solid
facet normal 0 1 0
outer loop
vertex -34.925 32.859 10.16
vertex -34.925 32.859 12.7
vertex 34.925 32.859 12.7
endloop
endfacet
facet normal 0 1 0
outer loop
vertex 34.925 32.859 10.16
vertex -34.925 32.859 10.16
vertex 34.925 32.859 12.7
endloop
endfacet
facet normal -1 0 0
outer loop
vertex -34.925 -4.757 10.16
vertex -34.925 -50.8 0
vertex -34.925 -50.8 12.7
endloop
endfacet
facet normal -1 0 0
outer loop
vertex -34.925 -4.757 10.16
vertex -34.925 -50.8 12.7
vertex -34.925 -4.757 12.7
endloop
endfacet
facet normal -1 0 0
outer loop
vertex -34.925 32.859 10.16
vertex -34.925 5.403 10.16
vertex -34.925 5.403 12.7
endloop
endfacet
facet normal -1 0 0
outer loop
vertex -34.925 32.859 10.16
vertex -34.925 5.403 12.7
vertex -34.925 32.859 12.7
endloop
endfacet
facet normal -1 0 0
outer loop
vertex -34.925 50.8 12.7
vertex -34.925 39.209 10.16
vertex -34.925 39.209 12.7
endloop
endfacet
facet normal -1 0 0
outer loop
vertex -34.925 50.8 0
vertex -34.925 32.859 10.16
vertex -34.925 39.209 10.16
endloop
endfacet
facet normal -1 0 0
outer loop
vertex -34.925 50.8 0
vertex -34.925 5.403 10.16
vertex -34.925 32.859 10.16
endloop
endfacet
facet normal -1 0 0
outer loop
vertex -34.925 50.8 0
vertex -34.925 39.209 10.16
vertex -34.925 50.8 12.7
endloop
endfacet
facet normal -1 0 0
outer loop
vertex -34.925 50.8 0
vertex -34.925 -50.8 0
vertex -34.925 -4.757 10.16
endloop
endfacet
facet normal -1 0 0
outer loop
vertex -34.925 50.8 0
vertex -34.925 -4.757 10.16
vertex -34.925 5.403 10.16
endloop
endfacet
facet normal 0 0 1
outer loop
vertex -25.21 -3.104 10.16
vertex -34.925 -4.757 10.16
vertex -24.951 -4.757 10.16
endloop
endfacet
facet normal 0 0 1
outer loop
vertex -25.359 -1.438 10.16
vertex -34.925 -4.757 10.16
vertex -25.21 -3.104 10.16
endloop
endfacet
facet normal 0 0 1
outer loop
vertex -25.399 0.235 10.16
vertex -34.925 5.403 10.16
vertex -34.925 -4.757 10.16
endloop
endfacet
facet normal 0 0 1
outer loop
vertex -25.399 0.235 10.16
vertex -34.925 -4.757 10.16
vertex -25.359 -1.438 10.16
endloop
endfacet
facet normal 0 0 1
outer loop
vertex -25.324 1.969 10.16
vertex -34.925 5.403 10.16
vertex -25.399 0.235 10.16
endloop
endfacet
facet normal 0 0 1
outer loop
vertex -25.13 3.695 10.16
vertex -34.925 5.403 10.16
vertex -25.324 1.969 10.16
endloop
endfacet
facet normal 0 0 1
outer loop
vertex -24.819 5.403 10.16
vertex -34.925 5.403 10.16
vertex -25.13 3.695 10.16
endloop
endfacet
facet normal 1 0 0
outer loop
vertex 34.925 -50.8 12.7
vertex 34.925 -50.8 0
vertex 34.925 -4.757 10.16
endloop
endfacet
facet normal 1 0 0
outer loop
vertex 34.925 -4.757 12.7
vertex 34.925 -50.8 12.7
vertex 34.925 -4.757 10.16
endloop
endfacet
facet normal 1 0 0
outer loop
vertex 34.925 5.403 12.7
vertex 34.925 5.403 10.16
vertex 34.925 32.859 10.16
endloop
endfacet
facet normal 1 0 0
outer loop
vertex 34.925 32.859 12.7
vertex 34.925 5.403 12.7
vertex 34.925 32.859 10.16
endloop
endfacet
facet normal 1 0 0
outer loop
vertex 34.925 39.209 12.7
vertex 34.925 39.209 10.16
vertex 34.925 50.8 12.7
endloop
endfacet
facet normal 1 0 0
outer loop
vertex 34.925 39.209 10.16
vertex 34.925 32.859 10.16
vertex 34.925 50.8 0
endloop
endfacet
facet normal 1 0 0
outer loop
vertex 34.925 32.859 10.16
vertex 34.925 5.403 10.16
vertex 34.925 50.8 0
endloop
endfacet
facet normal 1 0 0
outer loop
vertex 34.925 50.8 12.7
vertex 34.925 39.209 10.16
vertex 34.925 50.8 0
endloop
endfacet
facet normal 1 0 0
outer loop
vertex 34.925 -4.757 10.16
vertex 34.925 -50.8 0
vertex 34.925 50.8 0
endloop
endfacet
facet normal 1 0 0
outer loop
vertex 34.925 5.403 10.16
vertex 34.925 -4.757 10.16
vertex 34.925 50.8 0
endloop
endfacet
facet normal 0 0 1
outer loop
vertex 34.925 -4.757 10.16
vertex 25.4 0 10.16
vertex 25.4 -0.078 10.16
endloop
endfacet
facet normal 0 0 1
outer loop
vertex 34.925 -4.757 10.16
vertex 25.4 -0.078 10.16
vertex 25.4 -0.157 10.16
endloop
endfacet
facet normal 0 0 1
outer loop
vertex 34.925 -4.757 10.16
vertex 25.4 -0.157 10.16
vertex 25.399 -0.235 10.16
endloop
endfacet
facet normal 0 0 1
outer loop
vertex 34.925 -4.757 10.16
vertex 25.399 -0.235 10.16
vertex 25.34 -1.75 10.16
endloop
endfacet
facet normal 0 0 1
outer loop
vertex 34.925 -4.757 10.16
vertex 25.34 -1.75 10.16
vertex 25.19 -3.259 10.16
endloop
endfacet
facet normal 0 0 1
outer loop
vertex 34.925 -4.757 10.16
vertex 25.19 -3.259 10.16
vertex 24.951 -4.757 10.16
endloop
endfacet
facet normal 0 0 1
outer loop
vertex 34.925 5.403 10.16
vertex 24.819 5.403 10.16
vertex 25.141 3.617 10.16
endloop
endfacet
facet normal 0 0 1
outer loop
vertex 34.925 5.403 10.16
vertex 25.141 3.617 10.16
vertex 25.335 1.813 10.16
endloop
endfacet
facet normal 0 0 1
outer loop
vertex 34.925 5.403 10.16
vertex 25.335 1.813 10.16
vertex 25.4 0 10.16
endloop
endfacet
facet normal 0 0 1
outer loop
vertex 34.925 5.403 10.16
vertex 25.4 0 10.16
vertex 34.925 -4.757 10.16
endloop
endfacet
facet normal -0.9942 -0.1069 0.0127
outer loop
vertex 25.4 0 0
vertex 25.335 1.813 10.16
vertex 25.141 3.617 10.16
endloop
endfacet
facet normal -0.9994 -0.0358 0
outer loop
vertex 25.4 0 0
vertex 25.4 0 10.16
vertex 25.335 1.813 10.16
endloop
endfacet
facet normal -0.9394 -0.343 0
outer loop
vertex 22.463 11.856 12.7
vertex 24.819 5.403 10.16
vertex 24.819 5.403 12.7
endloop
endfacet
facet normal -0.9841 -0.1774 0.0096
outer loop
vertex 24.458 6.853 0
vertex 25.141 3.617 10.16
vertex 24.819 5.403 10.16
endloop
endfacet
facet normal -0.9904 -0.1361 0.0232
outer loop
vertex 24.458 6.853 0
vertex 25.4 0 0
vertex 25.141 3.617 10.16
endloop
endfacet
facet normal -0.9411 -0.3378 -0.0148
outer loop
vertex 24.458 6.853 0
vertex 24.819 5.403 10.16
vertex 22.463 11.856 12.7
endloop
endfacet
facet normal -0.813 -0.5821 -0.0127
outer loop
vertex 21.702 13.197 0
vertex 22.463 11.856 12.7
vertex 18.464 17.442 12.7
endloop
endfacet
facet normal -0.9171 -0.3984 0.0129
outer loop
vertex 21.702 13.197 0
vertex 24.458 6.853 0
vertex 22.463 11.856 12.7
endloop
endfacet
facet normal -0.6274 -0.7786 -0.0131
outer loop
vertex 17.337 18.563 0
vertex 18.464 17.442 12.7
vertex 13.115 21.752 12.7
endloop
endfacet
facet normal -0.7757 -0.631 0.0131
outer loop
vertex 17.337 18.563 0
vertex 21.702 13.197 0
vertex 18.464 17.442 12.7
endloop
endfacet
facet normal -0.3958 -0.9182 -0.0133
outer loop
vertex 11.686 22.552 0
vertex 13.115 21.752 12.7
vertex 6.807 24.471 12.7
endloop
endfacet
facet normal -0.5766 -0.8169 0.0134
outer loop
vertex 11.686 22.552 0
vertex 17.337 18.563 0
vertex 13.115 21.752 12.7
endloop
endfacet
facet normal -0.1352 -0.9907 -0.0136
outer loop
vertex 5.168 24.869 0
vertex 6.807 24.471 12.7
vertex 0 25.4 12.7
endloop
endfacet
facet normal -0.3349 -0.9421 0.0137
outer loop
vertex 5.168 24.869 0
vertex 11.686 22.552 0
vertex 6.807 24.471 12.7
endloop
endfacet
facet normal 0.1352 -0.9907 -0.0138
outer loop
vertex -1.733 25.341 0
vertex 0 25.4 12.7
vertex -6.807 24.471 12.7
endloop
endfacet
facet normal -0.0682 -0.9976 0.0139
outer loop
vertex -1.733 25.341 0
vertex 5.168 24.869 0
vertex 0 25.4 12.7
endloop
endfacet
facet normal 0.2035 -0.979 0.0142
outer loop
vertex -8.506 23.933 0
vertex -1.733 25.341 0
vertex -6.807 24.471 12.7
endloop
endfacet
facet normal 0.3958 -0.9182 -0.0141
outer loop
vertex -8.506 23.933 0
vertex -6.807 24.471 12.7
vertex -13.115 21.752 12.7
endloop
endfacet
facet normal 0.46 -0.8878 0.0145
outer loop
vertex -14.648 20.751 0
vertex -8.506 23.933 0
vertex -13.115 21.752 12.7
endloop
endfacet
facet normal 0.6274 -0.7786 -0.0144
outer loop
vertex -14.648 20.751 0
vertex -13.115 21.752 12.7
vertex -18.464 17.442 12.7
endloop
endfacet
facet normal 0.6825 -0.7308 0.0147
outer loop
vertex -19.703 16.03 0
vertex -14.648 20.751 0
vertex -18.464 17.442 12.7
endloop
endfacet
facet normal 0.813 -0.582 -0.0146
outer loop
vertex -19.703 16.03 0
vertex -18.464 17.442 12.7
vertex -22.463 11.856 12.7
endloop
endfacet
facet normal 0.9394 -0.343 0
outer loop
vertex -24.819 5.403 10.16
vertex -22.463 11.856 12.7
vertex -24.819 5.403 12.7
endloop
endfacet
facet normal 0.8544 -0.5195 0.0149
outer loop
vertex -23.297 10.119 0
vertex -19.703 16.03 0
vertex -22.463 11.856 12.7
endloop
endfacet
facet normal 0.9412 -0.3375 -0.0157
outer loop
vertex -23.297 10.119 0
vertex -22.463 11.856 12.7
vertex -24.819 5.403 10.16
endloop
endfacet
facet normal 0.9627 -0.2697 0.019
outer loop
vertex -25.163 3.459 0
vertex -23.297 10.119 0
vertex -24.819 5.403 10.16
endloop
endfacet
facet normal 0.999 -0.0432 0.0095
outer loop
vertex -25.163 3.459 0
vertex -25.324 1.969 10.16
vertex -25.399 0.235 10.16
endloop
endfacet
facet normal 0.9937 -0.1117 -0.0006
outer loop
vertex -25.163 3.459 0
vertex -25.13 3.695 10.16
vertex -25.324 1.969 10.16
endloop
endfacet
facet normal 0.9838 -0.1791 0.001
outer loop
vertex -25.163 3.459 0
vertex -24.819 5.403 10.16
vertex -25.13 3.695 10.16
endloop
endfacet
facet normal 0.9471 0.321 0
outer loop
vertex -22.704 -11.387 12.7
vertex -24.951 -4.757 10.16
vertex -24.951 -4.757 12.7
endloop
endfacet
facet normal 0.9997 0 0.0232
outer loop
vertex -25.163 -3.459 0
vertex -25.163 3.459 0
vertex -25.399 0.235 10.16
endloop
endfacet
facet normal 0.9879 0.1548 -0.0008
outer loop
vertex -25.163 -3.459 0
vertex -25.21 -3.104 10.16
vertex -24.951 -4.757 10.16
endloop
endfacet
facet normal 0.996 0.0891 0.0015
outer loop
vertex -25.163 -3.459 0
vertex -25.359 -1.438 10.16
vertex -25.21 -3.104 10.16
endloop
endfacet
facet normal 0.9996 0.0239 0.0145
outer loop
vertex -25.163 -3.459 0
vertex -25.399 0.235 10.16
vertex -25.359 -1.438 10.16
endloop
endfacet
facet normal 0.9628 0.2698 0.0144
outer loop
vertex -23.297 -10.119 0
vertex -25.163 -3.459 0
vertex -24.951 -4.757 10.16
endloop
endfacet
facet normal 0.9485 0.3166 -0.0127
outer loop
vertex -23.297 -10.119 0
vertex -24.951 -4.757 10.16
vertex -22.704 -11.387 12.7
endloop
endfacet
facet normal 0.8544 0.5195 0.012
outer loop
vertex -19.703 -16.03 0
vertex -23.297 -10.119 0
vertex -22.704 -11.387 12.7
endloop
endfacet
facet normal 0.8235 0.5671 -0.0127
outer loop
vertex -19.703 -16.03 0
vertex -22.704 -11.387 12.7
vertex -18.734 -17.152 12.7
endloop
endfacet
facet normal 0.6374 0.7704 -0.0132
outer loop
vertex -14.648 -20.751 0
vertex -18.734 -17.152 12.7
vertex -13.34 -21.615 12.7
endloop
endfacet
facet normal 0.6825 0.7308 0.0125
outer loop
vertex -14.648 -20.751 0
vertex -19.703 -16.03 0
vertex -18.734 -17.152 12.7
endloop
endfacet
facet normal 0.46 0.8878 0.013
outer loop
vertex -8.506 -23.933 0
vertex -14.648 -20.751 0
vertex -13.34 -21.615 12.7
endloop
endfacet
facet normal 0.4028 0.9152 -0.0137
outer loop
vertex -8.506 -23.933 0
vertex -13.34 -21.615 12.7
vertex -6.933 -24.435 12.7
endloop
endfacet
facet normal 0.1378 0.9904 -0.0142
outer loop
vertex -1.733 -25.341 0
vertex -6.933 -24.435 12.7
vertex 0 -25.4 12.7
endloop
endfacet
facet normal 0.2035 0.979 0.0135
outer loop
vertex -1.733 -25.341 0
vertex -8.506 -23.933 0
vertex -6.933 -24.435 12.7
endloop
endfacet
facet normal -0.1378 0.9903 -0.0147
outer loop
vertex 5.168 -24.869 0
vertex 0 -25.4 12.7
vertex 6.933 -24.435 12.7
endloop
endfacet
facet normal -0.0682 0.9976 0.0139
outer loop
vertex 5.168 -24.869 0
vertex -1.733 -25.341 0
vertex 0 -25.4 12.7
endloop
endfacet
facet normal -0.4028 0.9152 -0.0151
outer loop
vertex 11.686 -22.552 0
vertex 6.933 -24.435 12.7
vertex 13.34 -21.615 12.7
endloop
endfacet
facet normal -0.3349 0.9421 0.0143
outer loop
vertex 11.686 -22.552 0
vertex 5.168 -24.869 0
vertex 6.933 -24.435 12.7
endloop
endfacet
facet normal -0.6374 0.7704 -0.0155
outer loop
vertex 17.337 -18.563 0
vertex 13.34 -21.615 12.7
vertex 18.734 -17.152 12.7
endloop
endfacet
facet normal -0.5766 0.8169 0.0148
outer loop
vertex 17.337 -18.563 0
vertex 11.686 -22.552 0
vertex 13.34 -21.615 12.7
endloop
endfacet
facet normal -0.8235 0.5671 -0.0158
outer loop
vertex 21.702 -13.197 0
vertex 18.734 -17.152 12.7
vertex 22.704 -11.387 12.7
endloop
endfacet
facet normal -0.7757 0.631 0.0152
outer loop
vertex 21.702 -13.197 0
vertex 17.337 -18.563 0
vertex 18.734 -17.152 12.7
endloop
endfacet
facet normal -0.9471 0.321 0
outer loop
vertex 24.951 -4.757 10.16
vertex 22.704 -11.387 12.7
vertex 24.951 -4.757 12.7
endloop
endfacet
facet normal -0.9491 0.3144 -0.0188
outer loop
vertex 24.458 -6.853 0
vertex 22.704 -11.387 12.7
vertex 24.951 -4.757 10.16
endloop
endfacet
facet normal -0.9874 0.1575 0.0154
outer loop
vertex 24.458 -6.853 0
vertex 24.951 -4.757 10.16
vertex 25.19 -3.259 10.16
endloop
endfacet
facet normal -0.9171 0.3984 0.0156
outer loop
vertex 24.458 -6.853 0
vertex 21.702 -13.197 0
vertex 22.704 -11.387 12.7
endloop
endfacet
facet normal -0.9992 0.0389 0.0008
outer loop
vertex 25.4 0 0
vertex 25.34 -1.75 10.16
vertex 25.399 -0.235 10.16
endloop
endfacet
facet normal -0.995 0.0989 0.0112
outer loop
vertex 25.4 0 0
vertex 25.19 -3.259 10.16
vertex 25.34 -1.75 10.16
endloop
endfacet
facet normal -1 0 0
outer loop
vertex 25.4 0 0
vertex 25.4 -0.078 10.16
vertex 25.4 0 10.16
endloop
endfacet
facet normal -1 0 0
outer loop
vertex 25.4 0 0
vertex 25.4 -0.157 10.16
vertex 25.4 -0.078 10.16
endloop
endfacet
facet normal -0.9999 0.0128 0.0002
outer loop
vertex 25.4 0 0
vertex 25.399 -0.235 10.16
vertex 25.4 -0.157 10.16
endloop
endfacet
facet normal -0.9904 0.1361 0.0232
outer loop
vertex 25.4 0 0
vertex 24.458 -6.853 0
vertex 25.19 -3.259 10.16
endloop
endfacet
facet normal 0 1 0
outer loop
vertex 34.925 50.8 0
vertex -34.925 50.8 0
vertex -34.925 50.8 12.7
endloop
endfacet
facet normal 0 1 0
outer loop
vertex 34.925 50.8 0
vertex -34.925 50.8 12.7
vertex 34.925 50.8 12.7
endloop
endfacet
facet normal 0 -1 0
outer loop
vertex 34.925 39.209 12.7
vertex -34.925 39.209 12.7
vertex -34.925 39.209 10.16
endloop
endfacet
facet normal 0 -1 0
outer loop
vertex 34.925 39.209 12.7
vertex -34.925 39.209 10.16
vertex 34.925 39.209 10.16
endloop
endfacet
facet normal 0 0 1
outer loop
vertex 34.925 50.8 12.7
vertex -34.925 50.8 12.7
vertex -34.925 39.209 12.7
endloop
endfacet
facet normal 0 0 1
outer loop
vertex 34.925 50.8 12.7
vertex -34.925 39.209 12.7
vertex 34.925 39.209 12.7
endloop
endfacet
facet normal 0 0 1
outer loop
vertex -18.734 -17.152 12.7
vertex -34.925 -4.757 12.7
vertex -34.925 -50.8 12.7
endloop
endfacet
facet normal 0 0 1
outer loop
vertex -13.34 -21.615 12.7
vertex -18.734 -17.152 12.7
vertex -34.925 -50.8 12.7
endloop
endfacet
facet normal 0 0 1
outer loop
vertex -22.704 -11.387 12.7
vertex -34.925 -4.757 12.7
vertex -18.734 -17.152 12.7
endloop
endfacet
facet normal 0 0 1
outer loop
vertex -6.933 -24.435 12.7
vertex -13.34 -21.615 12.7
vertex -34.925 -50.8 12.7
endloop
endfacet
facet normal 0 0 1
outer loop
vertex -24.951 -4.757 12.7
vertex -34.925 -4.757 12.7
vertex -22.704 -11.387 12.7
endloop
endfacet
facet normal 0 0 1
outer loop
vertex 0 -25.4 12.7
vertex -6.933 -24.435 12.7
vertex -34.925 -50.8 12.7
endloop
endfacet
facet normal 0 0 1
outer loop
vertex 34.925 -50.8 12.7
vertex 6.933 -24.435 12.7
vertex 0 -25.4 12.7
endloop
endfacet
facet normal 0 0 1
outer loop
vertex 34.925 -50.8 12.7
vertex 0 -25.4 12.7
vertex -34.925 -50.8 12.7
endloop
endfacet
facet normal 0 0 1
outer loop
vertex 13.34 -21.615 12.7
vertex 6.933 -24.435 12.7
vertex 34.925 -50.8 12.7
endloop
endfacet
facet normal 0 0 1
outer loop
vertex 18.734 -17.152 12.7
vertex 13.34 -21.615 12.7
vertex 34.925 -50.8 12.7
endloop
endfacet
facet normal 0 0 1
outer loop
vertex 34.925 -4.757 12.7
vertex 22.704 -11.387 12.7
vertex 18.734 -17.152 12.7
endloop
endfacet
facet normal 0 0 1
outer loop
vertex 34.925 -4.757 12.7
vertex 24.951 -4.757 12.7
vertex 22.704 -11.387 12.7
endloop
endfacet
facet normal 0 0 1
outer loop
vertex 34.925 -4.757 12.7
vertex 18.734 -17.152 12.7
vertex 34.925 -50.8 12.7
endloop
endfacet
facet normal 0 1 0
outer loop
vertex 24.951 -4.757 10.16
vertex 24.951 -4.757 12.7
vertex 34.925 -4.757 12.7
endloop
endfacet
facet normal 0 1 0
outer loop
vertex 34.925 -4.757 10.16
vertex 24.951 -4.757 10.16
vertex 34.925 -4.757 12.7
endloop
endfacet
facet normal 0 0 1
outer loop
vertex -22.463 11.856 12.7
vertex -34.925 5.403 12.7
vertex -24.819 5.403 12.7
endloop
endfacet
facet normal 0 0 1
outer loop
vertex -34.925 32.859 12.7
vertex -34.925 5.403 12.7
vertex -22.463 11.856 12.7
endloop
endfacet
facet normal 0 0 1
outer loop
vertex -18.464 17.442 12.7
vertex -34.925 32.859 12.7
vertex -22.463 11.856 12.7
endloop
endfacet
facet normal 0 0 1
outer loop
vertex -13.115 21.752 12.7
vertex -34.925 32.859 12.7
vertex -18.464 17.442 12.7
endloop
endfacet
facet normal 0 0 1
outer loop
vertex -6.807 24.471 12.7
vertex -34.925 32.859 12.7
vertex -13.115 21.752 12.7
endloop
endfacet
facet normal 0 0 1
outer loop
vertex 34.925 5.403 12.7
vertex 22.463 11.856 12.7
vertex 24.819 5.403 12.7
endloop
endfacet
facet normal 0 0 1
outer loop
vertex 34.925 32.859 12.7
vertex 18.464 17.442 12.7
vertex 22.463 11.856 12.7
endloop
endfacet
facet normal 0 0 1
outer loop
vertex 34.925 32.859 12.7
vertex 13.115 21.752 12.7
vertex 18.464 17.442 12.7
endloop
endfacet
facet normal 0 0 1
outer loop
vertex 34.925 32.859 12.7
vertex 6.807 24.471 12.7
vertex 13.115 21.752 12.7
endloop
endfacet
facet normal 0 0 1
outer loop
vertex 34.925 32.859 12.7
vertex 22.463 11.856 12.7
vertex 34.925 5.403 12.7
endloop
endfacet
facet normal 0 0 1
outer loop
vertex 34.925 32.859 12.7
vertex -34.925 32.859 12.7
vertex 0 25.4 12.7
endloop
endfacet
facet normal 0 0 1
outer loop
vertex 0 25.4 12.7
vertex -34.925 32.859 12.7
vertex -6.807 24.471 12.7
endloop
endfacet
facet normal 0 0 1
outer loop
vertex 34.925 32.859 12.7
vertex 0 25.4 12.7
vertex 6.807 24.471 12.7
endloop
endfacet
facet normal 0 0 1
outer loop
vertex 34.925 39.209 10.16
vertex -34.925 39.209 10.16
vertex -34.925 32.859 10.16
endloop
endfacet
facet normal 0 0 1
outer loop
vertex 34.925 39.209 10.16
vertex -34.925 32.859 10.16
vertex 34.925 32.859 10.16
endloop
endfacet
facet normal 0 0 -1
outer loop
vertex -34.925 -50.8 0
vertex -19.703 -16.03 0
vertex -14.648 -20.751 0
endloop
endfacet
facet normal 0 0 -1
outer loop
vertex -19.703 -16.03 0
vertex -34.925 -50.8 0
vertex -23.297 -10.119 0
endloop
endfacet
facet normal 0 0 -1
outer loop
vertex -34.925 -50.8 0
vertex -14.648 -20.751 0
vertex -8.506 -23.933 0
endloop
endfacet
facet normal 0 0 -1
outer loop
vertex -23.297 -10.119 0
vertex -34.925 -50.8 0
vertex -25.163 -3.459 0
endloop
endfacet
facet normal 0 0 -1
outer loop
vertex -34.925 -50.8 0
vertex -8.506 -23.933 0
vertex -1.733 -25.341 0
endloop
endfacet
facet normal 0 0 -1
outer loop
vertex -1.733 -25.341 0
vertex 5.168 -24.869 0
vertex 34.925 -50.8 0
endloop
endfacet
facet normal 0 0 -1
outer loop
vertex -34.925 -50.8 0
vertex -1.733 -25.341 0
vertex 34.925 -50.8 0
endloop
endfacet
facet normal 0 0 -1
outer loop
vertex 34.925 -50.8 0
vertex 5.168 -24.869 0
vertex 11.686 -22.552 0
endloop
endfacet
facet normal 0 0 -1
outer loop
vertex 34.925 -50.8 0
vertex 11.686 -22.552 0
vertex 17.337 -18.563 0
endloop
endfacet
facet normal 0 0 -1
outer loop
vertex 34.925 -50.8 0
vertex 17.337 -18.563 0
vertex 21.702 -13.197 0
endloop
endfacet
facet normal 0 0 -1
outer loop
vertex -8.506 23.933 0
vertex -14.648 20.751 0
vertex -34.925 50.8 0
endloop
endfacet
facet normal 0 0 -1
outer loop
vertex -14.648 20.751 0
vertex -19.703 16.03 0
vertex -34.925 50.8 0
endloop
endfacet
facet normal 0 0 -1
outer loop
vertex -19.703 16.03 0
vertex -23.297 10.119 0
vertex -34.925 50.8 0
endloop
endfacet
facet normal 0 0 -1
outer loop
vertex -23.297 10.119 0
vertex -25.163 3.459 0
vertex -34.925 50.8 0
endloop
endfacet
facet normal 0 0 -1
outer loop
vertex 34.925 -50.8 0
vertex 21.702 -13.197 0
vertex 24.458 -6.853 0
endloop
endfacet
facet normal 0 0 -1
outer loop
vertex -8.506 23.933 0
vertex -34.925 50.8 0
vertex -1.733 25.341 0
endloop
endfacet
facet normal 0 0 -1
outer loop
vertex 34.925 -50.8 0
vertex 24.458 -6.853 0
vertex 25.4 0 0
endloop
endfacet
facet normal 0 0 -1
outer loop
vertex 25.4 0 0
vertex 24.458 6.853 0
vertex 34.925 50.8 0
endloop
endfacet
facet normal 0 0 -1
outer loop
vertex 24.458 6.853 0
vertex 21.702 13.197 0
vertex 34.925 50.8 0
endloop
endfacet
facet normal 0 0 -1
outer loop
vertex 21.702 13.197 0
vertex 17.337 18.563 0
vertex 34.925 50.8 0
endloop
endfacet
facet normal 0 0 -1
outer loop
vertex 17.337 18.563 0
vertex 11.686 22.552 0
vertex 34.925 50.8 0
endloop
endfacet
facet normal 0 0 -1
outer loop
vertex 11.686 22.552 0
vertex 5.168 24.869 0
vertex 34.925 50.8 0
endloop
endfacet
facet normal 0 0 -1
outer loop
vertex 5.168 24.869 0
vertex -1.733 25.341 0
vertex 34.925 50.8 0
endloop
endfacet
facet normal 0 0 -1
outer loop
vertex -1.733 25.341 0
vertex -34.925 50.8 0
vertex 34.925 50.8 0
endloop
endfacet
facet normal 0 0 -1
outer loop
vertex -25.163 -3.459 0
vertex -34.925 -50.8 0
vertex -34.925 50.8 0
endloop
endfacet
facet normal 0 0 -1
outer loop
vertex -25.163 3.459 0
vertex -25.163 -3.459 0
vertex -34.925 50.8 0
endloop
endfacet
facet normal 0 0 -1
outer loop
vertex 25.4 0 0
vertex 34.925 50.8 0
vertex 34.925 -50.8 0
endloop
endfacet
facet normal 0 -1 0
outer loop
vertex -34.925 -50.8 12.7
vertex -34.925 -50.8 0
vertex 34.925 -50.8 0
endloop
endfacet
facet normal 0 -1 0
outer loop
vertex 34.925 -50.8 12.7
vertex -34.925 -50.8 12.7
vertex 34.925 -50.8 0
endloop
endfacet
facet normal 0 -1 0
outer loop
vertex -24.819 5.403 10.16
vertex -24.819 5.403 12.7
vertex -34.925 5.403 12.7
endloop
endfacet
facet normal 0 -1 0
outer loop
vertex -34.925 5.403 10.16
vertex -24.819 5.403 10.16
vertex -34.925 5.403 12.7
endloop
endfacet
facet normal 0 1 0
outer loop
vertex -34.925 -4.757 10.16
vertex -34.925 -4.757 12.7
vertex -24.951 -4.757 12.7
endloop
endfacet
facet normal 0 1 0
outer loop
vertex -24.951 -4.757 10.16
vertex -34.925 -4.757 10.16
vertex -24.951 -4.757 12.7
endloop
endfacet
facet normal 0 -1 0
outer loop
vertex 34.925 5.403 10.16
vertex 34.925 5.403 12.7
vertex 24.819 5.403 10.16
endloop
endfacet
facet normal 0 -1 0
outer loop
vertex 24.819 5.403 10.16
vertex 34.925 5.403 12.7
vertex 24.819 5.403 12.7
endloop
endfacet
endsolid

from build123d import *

# Parameters (mm, degrees)
F0_W     = 69.85
F0_H     = 101.6
F0_R     = 25.4
F1_DEPTH = 12.7
F2_W     = 69.85
F2_H     = 6.35
F3_DEPTH = 2.54


with BuildPart() as f1:
    # F0 (on Top) → F1 (new body)
    with BuildSketch(Plane.XY):
        Rectangle(F0_W, F0_H)
        Circle(F0_R, mode=Mode.SUBTRACT)
    extrude(amount=F1_DEPTH)

    # F2 (on face) → F3 (cut)
    with BuildSketch(Plane.XY.offset(12.7)):
        with BuildLine():
            Line((-24.8187093164, 5.4029314144), (-34.925, 5.4029314144))
            Line((-34.925, 5.4029314144), (-34.925, 0.3229314144))
            Line((-34.925, 0.3229314144), (-25.3989142655, 0.2348491713))
            ThreePointArc((-25.3989142655, 0.2348491713), (-25.2414282098, 2.8337787368), (-24.8187093164, 5.4029314144))
        make_face()
        with BuildLine():
            Line((-25.3989142655, 0.2348491713), (-34.925, 0.3229314144))
            Line((-34.925, 0.3229314144), (-34.925, -4.7570685856))
            Line((-34.925, -4.7570685856), (-24.9505570774, -4.7570685856))
            ThreePointArc((-24.9505570774, -4.7570685856), (-25.2981644957, -2.2721956671), (-25.3989142655, 0.2348491713))
        make_face()
        with BuildLine():
            Line((34.925, -0.3229314144), (34.925, 5.4029314144))
            Line((34.925, 5.4029314144), (24.8187093164, 5.4029314144))
            ThreePointArc((24.8187093164, 5.4029314144), (25.2542592114, 2.7170557009), (25.4, 0))
            ThreePointArc((25.4, 0), (25.3997285649, -0.1174258405), (25.3989142655, -0.2348491713))
            Line((25.3989142655, -0.2348491713), (34.925, -0.3229314144))
        make_face()
        with BuildLine():
            Line((34.925, -4.7570685856), (34.925, -0.3229314144))
            Line((34.925, -0.3229314144), (25.3989142655, -0.2348491713))
            ThreePointArc((25.3989142655, -0.2348491713), (25.2760743241, -2.5060061383), (24.9505570774, -4.7570685856))
            Line((24.9505570774, -4.7570685856), (34.925, -4.7570685856))
        make_face()
        with Locations((0, 36.0342099249)):
            Rectangle(F2_W, F2_H)
    extrude(amount=-F3_DEPTH, mode=Mode.SUBTRACT)


solid = f1.part
